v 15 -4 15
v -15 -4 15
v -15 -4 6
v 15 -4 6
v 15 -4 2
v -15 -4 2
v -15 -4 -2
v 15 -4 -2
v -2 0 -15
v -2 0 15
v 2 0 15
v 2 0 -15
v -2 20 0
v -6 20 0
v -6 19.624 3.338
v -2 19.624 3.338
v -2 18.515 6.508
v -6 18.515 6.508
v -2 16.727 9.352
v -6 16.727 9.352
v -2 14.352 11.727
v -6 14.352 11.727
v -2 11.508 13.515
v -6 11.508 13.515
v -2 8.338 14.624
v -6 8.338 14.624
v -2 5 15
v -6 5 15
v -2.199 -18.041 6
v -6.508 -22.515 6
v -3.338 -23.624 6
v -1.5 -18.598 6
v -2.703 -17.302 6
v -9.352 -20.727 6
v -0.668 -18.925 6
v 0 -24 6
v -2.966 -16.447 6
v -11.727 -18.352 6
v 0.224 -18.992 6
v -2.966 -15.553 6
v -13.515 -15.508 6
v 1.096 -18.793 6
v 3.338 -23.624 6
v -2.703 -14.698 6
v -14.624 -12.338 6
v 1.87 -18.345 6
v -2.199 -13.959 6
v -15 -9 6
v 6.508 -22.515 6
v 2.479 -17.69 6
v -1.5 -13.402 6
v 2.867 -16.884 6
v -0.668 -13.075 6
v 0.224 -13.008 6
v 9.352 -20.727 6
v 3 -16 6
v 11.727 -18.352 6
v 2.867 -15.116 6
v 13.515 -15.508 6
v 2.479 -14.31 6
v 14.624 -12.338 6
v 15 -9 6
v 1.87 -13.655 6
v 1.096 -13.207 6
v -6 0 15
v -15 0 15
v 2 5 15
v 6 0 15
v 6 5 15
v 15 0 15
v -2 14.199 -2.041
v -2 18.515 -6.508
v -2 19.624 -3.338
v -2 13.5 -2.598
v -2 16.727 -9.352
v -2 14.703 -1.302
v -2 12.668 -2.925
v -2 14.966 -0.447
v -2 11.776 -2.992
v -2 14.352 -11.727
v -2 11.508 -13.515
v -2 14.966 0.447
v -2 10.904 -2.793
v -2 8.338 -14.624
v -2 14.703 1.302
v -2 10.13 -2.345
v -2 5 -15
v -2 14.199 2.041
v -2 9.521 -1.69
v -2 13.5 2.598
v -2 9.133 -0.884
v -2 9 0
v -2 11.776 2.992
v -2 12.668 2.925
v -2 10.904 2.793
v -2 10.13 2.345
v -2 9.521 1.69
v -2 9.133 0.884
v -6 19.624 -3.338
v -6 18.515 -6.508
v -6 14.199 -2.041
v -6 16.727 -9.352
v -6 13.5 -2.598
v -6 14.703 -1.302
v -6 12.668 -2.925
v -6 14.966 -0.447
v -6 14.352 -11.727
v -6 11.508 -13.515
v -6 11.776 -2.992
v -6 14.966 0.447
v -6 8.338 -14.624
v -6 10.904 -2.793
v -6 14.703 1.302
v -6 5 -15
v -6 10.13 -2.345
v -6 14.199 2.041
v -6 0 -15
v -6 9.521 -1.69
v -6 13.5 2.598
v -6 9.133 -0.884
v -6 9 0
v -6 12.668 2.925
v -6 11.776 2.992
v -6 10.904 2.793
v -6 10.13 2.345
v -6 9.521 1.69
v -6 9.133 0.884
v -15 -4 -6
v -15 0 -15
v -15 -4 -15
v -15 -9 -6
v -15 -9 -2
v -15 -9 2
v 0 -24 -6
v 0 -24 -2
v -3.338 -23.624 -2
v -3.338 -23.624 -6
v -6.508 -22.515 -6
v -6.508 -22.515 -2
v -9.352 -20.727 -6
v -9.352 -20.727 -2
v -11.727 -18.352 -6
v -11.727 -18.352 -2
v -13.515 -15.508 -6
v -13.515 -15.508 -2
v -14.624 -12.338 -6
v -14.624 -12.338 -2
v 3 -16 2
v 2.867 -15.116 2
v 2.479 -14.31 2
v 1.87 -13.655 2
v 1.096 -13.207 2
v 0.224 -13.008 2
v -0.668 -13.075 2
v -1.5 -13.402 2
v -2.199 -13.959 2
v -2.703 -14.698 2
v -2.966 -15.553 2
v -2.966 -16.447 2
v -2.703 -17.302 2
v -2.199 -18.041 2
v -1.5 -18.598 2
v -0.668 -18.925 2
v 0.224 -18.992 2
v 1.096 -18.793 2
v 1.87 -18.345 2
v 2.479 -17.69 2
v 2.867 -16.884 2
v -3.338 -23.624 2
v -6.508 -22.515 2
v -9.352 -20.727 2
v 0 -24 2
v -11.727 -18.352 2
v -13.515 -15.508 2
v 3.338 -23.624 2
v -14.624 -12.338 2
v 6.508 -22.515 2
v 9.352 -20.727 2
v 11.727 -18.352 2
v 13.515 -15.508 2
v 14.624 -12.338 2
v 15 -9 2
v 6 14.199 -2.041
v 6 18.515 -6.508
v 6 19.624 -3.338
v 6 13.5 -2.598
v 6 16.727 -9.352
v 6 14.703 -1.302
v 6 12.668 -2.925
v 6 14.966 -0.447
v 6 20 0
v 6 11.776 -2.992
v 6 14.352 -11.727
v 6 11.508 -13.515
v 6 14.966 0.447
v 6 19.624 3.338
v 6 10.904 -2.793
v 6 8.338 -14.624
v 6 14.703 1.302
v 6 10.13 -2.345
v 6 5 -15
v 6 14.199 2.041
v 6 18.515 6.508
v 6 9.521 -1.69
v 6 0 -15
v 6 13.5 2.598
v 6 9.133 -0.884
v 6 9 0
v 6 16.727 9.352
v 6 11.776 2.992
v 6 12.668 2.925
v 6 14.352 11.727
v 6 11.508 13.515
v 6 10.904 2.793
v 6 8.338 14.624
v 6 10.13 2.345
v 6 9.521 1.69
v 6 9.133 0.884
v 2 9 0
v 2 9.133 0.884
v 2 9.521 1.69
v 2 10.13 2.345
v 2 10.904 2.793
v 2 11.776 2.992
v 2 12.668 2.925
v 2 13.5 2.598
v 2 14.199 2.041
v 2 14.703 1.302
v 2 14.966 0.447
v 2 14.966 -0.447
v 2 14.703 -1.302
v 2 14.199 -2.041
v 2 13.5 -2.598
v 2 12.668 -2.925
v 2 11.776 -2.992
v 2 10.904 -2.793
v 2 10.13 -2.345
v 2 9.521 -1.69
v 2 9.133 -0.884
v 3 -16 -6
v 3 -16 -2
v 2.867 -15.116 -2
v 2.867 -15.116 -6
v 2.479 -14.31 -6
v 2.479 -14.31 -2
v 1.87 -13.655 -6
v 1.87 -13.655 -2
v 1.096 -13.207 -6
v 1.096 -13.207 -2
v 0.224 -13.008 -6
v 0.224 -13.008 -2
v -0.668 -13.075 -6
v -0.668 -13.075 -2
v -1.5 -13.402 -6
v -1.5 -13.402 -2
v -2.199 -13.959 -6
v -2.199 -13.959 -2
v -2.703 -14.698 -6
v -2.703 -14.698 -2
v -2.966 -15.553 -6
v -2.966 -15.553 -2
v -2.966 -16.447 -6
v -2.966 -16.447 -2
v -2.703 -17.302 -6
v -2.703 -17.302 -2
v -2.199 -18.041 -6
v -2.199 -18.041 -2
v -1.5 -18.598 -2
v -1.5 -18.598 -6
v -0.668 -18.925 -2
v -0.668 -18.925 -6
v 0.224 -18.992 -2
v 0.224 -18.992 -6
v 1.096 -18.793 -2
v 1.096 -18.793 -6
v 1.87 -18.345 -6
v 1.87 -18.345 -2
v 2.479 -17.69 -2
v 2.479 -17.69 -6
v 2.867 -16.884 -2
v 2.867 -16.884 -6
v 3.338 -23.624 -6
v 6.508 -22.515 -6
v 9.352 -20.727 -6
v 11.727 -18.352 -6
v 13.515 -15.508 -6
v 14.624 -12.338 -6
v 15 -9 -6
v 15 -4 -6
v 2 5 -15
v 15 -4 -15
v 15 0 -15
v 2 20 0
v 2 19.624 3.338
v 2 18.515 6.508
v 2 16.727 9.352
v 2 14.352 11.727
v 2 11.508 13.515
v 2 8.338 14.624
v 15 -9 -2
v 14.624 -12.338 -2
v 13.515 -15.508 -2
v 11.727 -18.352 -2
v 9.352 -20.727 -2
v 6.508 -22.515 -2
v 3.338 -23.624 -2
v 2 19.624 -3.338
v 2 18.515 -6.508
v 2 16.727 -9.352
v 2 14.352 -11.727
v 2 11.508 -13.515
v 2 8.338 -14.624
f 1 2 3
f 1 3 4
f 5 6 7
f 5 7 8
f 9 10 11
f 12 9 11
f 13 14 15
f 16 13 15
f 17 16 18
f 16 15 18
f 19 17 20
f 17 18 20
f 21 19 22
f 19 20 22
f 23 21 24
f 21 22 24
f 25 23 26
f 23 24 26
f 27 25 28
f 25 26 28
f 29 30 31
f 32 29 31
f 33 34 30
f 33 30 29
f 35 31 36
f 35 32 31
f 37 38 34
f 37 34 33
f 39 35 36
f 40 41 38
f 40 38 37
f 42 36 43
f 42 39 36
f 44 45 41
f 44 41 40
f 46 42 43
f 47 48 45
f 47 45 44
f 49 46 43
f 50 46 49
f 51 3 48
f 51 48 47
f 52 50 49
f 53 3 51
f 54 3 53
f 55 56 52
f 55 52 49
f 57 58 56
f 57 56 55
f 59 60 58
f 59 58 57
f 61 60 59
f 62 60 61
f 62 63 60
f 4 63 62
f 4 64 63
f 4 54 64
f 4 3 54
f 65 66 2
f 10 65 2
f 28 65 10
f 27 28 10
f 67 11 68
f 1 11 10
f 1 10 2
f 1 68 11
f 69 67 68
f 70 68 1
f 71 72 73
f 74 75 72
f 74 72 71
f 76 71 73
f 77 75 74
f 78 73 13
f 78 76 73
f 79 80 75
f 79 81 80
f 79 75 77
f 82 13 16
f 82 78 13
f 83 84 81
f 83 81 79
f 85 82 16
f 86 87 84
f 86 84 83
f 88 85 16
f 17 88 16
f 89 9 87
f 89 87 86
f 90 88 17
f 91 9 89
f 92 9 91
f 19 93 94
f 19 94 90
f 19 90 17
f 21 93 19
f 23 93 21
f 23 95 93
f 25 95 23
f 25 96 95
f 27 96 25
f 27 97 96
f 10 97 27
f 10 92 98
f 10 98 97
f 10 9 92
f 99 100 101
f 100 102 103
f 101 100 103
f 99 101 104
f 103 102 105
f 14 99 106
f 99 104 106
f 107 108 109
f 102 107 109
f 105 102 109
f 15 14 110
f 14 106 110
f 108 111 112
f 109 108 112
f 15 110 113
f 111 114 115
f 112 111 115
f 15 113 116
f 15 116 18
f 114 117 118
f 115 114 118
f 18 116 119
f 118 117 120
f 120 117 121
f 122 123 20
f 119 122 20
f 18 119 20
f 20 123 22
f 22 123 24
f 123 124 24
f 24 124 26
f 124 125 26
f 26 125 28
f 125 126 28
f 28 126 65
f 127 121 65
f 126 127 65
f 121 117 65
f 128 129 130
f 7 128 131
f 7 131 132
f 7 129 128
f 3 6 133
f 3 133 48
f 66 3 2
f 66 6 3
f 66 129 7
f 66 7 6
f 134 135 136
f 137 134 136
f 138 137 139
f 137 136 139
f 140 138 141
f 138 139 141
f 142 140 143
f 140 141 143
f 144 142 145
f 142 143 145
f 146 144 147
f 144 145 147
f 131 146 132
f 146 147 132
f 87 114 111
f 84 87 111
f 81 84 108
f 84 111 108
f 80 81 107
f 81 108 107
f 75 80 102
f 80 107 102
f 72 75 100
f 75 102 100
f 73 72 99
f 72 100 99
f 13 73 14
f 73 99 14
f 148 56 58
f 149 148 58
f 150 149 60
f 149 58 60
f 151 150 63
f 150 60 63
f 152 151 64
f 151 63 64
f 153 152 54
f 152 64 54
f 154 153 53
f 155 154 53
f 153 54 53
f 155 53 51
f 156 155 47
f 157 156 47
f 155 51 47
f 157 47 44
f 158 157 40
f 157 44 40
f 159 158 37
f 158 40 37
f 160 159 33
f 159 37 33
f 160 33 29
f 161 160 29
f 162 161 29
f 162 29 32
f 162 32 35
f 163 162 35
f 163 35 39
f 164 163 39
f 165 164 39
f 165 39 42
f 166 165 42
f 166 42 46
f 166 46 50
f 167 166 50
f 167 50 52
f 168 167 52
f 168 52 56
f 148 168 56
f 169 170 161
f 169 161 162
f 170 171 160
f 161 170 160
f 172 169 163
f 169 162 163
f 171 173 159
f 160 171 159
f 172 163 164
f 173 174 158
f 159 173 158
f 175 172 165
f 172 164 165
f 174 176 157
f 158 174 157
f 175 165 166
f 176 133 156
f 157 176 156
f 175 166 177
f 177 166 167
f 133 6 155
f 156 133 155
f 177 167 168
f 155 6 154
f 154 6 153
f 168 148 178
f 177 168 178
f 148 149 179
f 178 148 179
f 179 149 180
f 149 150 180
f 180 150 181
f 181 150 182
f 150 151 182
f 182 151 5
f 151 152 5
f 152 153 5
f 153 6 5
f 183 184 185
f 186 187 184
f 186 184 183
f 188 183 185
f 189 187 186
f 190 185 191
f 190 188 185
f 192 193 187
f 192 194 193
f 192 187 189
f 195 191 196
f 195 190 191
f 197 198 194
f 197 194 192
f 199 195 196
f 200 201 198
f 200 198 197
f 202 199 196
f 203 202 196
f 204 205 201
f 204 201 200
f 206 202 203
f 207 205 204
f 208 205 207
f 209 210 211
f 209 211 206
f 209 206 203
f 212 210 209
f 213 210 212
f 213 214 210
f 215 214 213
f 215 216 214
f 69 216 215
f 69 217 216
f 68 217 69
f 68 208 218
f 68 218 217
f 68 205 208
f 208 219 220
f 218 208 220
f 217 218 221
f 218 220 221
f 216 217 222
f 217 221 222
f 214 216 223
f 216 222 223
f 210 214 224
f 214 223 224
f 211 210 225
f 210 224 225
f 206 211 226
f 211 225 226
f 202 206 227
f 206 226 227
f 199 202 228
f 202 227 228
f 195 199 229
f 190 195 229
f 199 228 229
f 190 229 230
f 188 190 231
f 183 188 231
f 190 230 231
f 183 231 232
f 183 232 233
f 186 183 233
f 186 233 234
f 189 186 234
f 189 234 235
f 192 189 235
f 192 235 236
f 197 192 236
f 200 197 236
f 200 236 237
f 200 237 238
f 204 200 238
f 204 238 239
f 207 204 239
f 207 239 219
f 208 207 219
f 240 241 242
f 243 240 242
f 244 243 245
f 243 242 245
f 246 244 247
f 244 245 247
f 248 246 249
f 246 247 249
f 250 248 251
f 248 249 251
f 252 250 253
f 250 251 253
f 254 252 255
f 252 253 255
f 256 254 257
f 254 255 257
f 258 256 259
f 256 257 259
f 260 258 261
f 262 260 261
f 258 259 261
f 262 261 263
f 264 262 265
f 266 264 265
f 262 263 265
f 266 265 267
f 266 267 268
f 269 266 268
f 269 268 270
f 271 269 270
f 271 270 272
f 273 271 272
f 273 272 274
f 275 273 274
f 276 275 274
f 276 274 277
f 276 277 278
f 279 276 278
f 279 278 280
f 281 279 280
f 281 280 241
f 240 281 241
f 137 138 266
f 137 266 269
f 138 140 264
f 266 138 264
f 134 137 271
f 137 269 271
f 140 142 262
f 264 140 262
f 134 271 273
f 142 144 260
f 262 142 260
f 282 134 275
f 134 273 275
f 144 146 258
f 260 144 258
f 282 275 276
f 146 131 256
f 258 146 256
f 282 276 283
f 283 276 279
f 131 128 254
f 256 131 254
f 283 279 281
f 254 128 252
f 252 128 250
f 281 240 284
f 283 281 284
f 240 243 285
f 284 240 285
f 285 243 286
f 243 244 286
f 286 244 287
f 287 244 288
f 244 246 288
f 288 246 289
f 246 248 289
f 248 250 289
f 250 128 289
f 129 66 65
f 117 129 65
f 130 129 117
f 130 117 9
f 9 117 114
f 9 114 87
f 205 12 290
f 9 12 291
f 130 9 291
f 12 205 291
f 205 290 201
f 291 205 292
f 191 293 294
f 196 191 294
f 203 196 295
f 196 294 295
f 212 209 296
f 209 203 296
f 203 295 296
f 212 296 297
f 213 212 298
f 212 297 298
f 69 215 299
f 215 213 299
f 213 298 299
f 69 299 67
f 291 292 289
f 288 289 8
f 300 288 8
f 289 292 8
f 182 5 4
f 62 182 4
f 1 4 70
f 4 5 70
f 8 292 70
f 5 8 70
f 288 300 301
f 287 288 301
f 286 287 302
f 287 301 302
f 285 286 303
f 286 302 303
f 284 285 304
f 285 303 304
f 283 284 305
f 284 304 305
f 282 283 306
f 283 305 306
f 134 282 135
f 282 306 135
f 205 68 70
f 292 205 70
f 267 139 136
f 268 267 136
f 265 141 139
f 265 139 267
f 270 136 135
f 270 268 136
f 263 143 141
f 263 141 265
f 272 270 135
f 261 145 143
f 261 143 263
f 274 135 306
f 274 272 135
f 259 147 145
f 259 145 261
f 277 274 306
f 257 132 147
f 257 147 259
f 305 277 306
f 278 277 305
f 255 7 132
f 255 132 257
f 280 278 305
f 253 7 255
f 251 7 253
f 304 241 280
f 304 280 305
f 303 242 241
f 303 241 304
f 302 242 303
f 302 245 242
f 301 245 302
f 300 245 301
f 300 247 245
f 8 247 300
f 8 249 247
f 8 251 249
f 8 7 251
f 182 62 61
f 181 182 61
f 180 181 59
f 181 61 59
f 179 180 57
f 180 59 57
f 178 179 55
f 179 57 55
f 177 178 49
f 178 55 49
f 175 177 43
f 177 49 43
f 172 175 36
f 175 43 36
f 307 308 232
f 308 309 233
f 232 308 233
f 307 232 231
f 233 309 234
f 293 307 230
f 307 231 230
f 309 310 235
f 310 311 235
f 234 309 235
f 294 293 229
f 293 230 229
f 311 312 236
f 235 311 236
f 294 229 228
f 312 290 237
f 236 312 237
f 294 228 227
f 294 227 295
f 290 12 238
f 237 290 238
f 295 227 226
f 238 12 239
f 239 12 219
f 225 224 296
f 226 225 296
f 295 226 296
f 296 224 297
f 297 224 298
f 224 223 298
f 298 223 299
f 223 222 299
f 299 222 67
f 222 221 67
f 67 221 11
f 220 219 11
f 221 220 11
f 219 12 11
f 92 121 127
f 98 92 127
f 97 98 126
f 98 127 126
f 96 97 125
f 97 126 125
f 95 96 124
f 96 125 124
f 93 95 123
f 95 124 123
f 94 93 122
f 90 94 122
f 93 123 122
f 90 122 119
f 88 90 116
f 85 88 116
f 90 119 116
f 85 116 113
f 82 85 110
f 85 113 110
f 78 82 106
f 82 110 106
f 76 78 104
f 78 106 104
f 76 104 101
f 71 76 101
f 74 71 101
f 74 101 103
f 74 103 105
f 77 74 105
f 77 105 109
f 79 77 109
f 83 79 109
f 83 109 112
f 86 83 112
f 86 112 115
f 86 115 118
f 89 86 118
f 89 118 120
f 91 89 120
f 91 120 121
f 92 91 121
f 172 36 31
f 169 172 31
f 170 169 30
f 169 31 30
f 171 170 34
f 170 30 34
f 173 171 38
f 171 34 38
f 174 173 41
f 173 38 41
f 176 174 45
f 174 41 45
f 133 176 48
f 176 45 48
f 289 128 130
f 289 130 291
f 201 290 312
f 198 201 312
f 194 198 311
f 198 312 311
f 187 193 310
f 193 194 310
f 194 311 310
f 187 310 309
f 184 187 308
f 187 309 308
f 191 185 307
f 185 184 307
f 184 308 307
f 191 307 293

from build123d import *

# Parameters (mm, degrees)
F0_W      = 30
F0_H      = 30
F1_DEPTH  = 4
F2_W      = 4
F2_H      = 30
F3_DEPTH  = 20
F5_DEPTH  = 25
F6_R      = 3
F7_DEPTH  = 25
F8_W      = 30
F8_H      = 4
F9_DEPTH  = 20
F11_DEPTH = 25
F12_R     = 3
F13_DEPTH = 25


with BuildPart() as f1:
    # F0 (on Front) → F1 (new body)
    with BuildSketch(Plane.XZ):
        Rectangle(F0_W, F0_H)
    extrude(amount=F1_DEPTH)

    # F2 (on face) → F3 (join)
    with BuildSketch(Plane(origin=(0, 0, 0), x_dir=(-1, 0, 0), z_dir=(0, 1, 0))):
        with Locations((4, 0)):
            Rectangle(F2_W, F2_H)
        with Locations((-4, 0)):
            Rectangle(F2_W, F2_H)
    extrude(amount=F3_DEPTH)

    # F4 (on face) → F5 (cut)
    with BuildSketch(Plane(origin=(-6, 0, 0), x_dir=(0, -1, 0), z_dir=(-1, 0, 0))):
        with BuildLine():
            ThreePointArc((-5, -15), (-15.606602, -10.606602), (-20, 0))
            Line((-20, 0), (-20, -15))
            Line((-20, -15), (-5, -15))
        make_face()
        with BuildLine():
            Line((-5, 15), (-20, 15))
            Line((-20, 15), (-20, 0))
            ThreePointArc((-20, 0), (-15.606602, 10.606602), (-5, 15))
        make_face()
    extrude(amount=-F5_DEPTH, mode=Mode.SUBTRACT)

    # F6 (on face) → F7 (cut)
    with BuildSketch(Plane(origin=(-6, 0, 0), x_dir=(0, -1, 0), z_dir=(-1, 0, 0))):
        with Locations((-12, 0)):
            Circle(F6_R)
    extrude(amount=-F7_DEPTH, mode=Mode.SUBTRACT)

    # F8 (on face) → F9 (join)
    with BuildSketch(Plane.XZ.offset(4)):
        with Locations((0, 4)):
            Rectangle(F8_W, F8_H)
        with Locations((0, -4)):
            Rectangle(F8_W, F8_H)
    extrude(amount=F9_DEPTH)

    # F10 (on face) → F11 (cut)
    with BuildSketch(Plane.XY.offset(6)):
        with BuildLine():
            Line((-15, -24), (0, -24))
            ThreePointArc((0, -24), (-10.606602, -19.606602), (-15, -9))
            Line((-15, -9), (-15, -24))
        make_face()
        with BuildLine():
            ThreePointArc((15, -9), (10.606602, -19.606602), (0, -24))
            Line((0, -24), (15, -24))
            Line((15, -24), (15, -9))
        make_face()
    extrude(amount=-F11_DEPTH, mode=Mode.SUBTRACT)

    # F12 (on face) → F13 (cut)
    with BuildSketch(Plane.XY.offset(6)):
        with Locations((0, -16)):
            Circle(F12_R)
    extrude(amount=-F13_DEPTH, mode=Mode.SUBTRACT)


solid = f1.part
